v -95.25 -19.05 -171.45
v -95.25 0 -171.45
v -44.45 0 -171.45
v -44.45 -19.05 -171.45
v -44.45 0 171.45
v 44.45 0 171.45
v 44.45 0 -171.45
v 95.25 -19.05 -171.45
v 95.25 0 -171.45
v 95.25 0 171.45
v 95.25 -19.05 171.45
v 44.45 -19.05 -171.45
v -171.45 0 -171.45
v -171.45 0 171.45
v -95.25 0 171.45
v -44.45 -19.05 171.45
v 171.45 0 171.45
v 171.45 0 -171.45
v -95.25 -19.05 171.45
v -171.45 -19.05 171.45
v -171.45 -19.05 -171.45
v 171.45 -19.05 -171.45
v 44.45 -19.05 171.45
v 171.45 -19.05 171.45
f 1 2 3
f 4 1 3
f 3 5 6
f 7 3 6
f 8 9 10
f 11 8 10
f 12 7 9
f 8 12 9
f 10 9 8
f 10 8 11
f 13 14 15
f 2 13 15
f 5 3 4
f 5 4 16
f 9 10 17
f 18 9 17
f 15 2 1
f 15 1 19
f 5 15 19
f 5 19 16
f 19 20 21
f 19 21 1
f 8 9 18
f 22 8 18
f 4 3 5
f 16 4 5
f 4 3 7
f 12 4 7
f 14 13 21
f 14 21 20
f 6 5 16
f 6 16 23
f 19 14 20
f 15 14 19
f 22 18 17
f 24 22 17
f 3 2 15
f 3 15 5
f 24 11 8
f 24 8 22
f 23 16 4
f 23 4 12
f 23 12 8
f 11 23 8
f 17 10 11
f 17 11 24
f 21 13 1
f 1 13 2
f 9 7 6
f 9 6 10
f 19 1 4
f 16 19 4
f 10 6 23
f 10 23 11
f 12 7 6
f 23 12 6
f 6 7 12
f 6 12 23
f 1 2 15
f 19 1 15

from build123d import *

# Parameters (mm, degrees)
F1_W     = 76.2
F1_H     = 342.9
F2_DEPTH = 19.05
F1_W_2   = 50.8
F3_DEPTH = 19.05
F1_W_3   = 88.9
F4_DEPTH = 19.05


with BuildPart() as f2:
    # F1 (on Front) → F2 (new body)
    with BuildSketch(Plane.XZ):
        with Locations((133.35, 0)):
            Rectangle(F1_W, F1_H)
        with Locations((-133.35, 0)):
            Rectangle(F1_W, F1_H)
    extrude(amount=F2_DEPTH)


with BuildPart() as f3:
    # F1 (on Front) → F3 (new body)
    with BuildSketch(Plane.XZ):
        with Locations((-69.85, 0)):
            Rectangle(F1_W_2, F1_H)
        with Locations((69.85, 0)):
            Rectangle(F1_W_2, F1_H)
    extrude(amount=F3_DEPTH)


with BuildPart() as f4:
    # F1 (on Front) → F4 (new body)
    with BuildSketch(Plane.XZ):
        Rectangle(F1_W_3, F1_H)
    extrude(amount=F4_DEPTH)


solid = Compound([f2.part, f3.part, f4.part])
